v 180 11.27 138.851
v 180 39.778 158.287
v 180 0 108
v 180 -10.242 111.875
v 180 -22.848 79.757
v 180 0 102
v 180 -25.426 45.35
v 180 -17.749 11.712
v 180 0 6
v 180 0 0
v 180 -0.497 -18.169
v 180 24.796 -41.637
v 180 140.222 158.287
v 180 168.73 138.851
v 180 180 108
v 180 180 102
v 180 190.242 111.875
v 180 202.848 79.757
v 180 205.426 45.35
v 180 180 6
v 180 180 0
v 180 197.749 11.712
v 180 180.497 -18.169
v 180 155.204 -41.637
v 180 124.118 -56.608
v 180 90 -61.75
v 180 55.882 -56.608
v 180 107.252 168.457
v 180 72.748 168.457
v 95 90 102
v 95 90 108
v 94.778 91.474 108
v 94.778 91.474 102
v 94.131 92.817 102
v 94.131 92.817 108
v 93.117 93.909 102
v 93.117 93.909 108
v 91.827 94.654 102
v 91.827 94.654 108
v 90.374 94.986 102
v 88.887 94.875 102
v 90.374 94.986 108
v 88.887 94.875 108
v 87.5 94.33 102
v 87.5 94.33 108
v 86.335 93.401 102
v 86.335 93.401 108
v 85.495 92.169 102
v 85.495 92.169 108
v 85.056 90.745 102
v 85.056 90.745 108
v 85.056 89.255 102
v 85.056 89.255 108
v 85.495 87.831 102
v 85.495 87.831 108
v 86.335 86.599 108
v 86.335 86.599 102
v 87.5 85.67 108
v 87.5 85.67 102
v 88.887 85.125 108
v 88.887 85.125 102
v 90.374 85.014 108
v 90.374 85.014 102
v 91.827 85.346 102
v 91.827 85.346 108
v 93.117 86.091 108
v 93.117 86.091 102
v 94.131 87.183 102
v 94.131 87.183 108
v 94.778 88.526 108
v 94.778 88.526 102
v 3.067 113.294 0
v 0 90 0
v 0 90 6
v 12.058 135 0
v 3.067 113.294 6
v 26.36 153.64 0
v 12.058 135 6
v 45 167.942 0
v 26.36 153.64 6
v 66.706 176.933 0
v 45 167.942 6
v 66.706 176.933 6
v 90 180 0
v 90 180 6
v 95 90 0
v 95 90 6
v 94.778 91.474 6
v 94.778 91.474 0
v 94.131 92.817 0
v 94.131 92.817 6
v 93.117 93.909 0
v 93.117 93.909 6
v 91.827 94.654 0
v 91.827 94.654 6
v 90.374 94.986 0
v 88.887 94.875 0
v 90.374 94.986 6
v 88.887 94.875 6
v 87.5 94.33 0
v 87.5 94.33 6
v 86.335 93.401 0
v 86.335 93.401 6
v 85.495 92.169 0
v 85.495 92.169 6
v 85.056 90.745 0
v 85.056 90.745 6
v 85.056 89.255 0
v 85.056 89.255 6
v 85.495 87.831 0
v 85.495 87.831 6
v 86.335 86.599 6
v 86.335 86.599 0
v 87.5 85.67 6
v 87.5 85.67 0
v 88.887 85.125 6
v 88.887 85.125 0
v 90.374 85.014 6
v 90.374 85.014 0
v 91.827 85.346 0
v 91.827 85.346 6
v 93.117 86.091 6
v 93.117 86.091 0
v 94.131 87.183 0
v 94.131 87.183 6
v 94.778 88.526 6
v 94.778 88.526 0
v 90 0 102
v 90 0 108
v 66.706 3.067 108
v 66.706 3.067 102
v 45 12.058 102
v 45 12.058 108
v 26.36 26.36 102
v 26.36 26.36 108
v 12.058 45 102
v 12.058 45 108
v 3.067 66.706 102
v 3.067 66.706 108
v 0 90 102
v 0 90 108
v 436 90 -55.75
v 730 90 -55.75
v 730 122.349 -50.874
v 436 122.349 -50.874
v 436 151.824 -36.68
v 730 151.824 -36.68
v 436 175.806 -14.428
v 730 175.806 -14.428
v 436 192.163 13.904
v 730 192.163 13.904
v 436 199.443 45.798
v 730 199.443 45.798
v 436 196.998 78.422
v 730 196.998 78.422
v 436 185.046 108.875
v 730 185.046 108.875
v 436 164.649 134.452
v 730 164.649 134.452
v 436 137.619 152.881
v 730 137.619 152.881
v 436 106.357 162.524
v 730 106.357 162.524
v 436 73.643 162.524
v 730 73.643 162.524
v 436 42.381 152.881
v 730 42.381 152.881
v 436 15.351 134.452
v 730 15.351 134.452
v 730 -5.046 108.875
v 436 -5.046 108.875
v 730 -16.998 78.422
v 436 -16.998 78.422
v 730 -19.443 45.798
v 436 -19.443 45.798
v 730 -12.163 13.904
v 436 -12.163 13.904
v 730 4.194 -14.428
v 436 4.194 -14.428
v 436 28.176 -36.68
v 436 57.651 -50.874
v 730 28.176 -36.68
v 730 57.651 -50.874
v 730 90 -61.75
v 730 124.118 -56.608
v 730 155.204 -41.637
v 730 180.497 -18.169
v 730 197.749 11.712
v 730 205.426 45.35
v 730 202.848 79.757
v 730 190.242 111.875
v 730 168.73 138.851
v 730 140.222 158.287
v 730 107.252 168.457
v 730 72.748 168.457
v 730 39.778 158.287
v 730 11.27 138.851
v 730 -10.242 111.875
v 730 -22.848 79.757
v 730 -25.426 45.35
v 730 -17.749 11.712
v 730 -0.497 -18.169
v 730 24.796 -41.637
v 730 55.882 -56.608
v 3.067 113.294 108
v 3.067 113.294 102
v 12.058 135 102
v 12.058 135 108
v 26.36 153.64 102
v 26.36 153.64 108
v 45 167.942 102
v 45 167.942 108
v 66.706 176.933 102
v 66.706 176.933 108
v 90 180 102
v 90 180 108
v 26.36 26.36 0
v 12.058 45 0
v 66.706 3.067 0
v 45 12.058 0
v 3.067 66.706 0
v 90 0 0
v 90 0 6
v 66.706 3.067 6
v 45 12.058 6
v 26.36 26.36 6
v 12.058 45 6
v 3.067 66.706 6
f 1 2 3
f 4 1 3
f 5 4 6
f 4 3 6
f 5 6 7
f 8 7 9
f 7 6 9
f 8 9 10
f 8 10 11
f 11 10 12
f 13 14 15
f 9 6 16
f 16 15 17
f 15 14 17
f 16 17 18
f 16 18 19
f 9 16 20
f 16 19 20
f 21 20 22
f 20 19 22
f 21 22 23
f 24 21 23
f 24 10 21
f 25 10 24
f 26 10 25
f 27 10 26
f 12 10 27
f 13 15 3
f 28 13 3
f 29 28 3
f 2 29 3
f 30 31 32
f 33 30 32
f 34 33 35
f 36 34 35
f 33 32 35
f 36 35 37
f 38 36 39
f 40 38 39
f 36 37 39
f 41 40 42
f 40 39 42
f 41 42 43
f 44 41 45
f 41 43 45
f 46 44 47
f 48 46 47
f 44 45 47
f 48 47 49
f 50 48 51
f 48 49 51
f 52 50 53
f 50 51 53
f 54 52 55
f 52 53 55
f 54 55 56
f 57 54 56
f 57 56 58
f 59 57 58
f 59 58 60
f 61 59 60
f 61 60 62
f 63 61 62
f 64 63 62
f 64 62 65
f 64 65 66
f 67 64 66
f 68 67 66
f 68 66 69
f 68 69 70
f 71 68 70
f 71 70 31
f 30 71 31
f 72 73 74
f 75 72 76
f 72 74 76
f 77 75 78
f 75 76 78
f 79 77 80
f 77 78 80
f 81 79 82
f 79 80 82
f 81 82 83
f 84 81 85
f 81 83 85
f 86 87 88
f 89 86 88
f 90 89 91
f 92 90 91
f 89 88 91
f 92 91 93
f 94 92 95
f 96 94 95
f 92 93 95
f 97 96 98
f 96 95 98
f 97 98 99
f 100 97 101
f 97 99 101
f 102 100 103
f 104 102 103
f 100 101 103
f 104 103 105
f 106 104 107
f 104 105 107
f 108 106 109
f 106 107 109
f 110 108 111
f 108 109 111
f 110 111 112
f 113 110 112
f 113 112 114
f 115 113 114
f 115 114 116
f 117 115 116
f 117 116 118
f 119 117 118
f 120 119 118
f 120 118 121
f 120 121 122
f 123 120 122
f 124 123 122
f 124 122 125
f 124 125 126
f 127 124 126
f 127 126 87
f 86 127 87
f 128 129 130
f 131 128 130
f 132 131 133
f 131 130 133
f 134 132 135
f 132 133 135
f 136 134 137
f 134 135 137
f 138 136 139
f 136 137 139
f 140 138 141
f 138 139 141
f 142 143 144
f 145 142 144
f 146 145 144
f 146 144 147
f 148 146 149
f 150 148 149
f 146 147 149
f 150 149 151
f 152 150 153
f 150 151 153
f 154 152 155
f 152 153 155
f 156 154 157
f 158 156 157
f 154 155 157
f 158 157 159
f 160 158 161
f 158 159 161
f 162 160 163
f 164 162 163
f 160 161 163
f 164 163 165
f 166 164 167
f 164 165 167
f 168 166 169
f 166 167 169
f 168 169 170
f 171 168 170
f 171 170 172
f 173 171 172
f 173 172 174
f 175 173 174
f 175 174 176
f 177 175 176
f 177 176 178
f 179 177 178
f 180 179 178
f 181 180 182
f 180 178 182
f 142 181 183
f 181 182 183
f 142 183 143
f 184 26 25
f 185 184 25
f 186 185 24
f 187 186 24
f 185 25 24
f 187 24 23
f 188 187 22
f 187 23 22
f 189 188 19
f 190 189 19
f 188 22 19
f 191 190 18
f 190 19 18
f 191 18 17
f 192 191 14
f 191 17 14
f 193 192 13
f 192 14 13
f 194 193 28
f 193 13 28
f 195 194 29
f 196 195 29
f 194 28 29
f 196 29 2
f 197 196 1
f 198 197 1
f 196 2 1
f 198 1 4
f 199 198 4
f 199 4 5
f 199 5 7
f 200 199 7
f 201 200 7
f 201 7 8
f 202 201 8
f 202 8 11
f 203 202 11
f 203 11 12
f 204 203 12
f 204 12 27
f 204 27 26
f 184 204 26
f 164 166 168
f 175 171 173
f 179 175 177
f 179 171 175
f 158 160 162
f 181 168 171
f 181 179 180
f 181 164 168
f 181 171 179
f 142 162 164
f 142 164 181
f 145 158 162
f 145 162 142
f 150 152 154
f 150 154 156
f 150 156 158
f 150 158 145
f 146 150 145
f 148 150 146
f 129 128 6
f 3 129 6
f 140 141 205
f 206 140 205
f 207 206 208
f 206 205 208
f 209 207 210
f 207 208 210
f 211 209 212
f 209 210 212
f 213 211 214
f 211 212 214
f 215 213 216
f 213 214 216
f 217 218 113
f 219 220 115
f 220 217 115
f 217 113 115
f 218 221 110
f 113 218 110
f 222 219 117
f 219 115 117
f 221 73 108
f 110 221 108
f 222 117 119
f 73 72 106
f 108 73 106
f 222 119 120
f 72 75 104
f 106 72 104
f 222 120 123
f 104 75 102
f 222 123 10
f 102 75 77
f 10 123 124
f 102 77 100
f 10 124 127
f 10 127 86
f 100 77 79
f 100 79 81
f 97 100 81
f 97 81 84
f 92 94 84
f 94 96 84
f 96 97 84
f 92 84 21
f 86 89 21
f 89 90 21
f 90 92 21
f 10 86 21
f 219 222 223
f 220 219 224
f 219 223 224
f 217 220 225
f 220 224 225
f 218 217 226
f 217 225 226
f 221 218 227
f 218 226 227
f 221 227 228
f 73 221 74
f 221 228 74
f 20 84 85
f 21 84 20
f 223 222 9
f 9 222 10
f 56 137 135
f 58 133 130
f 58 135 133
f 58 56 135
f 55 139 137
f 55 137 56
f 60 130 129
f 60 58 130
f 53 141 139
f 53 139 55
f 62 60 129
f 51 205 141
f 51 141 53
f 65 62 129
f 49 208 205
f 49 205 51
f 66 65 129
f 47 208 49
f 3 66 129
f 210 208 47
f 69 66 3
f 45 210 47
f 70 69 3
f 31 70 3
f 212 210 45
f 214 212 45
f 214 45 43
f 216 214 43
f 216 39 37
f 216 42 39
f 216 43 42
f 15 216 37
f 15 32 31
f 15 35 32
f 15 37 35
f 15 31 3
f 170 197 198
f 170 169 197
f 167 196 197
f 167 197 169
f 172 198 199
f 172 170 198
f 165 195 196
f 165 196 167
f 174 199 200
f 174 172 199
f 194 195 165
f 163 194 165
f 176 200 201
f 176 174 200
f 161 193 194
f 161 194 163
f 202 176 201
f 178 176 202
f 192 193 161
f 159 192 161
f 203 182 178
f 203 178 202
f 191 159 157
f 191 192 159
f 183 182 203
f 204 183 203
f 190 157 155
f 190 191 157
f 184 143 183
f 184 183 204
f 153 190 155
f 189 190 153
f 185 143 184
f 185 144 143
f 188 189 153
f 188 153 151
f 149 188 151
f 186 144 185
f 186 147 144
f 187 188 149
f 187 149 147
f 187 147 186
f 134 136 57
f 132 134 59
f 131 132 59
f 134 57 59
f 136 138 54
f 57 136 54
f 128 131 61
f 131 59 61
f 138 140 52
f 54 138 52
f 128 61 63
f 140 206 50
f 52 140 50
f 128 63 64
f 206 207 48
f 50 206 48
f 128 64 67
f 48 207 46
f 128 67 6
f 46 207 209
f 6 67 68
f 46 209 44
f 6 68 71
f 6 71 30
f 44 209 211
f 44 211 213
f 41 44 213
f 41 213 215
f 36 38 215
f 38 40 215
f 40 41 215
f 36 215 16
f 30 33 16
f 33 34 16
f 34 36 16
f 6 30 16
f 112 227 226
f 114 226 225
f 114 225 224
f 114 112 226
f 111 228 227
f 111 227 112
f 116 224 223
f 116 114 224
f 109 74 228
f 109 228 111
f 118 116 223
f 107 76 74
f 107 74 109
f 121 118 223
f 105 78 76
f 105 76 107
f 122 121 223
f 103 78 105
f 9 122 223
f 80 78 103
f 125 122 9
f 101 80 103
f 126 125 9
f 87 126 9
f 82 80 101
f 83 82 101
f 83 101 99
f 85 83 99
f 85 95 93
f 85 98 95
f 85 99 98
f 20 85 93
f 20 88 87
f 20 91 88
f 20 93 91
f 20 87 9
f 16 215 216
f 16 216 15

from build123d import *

# Parameters (mm, degrees)
IZIM10_W                    = 180
IZIM10_H                    = 180
Y_KSEKLIK_EKSTR_ZYON1_DEPTH = 108
KES_EKSTR_ZYON7_DEPTH       = 108
IZIM13_R                    = 115.75
Y_KSEKLIK_EKSTR_ZYON2_DEPTH = 550
IZIM14_R                    = 109.75
KES_EKSTR_ZYON8_DEPTH       = 294
IZIM15_W                    = 180
IZIM15_H                    = 96
KES_EKSTR_ZYON9_DEPTH       = 294
IZIM16_R                    = 5
KES_EKSTR_ZYON10_DEPTH      = 294


with BuildPart() as part:
    # Çizim10 → Yükseklik-Ekstrüzyon1 (new body)
    with BuildSketch(Plane.XY):
        with Locations((90, 90)):
            Rectangle(IZIM10_W, IZIM10_H)
    extrude(amount=Y_KSEKLIK_EKSTR_ZYON1_DEPTH)

    # Çizim11 → Kes-Ekstrüzyon7 (cut)
    with BuildSketch(Plane.XY.offset(108)):
        with BuildLine():
            ThreePointArc((0, 90), (26.360389693, 153.639610307), (90, 180))
            Line((90, 180), (0, 180))
            Line((0, 180), (0, 90))
        make_face()
        with BuildLine():
            ThreePointArc((90, 0), (26.360389693, 26.360389693), (0, 90))
            Line((0, 90), (0, 0))
            Line((0, 0), (90, 0))
        make_face()
    extrude(amount=-KES_EKSTR_ZYON7_DEPTH, mode=Mode.SUBTRACT)

    # Çizim13 → Yükseklik-Ekstrüzyon2 (add)
    with BuildSketch(Plane(origin=(180, 0, 0), x_dir=(0, 0, -1), z_dir=(1, 0, 0))):
        with Locations((-54, 90)):
            Circle(IZIM13_R)
    extrude(amount=Y_KSEKLIK_EKSTR_ZYON2_DEPTH)

    # Çizim14 → Kes-Ekstrüzyon8 (cut)
    with BuildSketch(Plane(origin=(730, 0, 0), x_dir=(0, 0, -1), z_dir=(1, 0, 0))):
        with Locations((-54, 90)):
            Circle(IZIM14_R)
    extrude(amount=-KES_EKSTR_ZYON8_DEPTH, mode=Mode.SUBTRACT)

    # Çizim15 → Kes-Ekstrüzyon9 (cut)
    with BuildSketch(Plane(origin=(0, 180, 0), x_dir=(1, 0, 0), z_dir=(0, 1, 0))):
        with Locations((90, -54)):
            Rectangle(IZIM15_W, IZIM15_H)
    extrude(amount=-KES_EKSTR_ZYON9_DEPTH, mode=Mode.SUBTRACT)

    # Çizim16 → Kes-Ekstrüzyon10 (cut)
    with BuildSketch(Plane.XY.offset(108)):
        with Locations((90, 90)):
            Circle(IZIM16_R)
    extrude(amount=-KES_EKSTR_ZYON10_DEPTH, mode=Mode.SUBTRACT)


solid = part.part
